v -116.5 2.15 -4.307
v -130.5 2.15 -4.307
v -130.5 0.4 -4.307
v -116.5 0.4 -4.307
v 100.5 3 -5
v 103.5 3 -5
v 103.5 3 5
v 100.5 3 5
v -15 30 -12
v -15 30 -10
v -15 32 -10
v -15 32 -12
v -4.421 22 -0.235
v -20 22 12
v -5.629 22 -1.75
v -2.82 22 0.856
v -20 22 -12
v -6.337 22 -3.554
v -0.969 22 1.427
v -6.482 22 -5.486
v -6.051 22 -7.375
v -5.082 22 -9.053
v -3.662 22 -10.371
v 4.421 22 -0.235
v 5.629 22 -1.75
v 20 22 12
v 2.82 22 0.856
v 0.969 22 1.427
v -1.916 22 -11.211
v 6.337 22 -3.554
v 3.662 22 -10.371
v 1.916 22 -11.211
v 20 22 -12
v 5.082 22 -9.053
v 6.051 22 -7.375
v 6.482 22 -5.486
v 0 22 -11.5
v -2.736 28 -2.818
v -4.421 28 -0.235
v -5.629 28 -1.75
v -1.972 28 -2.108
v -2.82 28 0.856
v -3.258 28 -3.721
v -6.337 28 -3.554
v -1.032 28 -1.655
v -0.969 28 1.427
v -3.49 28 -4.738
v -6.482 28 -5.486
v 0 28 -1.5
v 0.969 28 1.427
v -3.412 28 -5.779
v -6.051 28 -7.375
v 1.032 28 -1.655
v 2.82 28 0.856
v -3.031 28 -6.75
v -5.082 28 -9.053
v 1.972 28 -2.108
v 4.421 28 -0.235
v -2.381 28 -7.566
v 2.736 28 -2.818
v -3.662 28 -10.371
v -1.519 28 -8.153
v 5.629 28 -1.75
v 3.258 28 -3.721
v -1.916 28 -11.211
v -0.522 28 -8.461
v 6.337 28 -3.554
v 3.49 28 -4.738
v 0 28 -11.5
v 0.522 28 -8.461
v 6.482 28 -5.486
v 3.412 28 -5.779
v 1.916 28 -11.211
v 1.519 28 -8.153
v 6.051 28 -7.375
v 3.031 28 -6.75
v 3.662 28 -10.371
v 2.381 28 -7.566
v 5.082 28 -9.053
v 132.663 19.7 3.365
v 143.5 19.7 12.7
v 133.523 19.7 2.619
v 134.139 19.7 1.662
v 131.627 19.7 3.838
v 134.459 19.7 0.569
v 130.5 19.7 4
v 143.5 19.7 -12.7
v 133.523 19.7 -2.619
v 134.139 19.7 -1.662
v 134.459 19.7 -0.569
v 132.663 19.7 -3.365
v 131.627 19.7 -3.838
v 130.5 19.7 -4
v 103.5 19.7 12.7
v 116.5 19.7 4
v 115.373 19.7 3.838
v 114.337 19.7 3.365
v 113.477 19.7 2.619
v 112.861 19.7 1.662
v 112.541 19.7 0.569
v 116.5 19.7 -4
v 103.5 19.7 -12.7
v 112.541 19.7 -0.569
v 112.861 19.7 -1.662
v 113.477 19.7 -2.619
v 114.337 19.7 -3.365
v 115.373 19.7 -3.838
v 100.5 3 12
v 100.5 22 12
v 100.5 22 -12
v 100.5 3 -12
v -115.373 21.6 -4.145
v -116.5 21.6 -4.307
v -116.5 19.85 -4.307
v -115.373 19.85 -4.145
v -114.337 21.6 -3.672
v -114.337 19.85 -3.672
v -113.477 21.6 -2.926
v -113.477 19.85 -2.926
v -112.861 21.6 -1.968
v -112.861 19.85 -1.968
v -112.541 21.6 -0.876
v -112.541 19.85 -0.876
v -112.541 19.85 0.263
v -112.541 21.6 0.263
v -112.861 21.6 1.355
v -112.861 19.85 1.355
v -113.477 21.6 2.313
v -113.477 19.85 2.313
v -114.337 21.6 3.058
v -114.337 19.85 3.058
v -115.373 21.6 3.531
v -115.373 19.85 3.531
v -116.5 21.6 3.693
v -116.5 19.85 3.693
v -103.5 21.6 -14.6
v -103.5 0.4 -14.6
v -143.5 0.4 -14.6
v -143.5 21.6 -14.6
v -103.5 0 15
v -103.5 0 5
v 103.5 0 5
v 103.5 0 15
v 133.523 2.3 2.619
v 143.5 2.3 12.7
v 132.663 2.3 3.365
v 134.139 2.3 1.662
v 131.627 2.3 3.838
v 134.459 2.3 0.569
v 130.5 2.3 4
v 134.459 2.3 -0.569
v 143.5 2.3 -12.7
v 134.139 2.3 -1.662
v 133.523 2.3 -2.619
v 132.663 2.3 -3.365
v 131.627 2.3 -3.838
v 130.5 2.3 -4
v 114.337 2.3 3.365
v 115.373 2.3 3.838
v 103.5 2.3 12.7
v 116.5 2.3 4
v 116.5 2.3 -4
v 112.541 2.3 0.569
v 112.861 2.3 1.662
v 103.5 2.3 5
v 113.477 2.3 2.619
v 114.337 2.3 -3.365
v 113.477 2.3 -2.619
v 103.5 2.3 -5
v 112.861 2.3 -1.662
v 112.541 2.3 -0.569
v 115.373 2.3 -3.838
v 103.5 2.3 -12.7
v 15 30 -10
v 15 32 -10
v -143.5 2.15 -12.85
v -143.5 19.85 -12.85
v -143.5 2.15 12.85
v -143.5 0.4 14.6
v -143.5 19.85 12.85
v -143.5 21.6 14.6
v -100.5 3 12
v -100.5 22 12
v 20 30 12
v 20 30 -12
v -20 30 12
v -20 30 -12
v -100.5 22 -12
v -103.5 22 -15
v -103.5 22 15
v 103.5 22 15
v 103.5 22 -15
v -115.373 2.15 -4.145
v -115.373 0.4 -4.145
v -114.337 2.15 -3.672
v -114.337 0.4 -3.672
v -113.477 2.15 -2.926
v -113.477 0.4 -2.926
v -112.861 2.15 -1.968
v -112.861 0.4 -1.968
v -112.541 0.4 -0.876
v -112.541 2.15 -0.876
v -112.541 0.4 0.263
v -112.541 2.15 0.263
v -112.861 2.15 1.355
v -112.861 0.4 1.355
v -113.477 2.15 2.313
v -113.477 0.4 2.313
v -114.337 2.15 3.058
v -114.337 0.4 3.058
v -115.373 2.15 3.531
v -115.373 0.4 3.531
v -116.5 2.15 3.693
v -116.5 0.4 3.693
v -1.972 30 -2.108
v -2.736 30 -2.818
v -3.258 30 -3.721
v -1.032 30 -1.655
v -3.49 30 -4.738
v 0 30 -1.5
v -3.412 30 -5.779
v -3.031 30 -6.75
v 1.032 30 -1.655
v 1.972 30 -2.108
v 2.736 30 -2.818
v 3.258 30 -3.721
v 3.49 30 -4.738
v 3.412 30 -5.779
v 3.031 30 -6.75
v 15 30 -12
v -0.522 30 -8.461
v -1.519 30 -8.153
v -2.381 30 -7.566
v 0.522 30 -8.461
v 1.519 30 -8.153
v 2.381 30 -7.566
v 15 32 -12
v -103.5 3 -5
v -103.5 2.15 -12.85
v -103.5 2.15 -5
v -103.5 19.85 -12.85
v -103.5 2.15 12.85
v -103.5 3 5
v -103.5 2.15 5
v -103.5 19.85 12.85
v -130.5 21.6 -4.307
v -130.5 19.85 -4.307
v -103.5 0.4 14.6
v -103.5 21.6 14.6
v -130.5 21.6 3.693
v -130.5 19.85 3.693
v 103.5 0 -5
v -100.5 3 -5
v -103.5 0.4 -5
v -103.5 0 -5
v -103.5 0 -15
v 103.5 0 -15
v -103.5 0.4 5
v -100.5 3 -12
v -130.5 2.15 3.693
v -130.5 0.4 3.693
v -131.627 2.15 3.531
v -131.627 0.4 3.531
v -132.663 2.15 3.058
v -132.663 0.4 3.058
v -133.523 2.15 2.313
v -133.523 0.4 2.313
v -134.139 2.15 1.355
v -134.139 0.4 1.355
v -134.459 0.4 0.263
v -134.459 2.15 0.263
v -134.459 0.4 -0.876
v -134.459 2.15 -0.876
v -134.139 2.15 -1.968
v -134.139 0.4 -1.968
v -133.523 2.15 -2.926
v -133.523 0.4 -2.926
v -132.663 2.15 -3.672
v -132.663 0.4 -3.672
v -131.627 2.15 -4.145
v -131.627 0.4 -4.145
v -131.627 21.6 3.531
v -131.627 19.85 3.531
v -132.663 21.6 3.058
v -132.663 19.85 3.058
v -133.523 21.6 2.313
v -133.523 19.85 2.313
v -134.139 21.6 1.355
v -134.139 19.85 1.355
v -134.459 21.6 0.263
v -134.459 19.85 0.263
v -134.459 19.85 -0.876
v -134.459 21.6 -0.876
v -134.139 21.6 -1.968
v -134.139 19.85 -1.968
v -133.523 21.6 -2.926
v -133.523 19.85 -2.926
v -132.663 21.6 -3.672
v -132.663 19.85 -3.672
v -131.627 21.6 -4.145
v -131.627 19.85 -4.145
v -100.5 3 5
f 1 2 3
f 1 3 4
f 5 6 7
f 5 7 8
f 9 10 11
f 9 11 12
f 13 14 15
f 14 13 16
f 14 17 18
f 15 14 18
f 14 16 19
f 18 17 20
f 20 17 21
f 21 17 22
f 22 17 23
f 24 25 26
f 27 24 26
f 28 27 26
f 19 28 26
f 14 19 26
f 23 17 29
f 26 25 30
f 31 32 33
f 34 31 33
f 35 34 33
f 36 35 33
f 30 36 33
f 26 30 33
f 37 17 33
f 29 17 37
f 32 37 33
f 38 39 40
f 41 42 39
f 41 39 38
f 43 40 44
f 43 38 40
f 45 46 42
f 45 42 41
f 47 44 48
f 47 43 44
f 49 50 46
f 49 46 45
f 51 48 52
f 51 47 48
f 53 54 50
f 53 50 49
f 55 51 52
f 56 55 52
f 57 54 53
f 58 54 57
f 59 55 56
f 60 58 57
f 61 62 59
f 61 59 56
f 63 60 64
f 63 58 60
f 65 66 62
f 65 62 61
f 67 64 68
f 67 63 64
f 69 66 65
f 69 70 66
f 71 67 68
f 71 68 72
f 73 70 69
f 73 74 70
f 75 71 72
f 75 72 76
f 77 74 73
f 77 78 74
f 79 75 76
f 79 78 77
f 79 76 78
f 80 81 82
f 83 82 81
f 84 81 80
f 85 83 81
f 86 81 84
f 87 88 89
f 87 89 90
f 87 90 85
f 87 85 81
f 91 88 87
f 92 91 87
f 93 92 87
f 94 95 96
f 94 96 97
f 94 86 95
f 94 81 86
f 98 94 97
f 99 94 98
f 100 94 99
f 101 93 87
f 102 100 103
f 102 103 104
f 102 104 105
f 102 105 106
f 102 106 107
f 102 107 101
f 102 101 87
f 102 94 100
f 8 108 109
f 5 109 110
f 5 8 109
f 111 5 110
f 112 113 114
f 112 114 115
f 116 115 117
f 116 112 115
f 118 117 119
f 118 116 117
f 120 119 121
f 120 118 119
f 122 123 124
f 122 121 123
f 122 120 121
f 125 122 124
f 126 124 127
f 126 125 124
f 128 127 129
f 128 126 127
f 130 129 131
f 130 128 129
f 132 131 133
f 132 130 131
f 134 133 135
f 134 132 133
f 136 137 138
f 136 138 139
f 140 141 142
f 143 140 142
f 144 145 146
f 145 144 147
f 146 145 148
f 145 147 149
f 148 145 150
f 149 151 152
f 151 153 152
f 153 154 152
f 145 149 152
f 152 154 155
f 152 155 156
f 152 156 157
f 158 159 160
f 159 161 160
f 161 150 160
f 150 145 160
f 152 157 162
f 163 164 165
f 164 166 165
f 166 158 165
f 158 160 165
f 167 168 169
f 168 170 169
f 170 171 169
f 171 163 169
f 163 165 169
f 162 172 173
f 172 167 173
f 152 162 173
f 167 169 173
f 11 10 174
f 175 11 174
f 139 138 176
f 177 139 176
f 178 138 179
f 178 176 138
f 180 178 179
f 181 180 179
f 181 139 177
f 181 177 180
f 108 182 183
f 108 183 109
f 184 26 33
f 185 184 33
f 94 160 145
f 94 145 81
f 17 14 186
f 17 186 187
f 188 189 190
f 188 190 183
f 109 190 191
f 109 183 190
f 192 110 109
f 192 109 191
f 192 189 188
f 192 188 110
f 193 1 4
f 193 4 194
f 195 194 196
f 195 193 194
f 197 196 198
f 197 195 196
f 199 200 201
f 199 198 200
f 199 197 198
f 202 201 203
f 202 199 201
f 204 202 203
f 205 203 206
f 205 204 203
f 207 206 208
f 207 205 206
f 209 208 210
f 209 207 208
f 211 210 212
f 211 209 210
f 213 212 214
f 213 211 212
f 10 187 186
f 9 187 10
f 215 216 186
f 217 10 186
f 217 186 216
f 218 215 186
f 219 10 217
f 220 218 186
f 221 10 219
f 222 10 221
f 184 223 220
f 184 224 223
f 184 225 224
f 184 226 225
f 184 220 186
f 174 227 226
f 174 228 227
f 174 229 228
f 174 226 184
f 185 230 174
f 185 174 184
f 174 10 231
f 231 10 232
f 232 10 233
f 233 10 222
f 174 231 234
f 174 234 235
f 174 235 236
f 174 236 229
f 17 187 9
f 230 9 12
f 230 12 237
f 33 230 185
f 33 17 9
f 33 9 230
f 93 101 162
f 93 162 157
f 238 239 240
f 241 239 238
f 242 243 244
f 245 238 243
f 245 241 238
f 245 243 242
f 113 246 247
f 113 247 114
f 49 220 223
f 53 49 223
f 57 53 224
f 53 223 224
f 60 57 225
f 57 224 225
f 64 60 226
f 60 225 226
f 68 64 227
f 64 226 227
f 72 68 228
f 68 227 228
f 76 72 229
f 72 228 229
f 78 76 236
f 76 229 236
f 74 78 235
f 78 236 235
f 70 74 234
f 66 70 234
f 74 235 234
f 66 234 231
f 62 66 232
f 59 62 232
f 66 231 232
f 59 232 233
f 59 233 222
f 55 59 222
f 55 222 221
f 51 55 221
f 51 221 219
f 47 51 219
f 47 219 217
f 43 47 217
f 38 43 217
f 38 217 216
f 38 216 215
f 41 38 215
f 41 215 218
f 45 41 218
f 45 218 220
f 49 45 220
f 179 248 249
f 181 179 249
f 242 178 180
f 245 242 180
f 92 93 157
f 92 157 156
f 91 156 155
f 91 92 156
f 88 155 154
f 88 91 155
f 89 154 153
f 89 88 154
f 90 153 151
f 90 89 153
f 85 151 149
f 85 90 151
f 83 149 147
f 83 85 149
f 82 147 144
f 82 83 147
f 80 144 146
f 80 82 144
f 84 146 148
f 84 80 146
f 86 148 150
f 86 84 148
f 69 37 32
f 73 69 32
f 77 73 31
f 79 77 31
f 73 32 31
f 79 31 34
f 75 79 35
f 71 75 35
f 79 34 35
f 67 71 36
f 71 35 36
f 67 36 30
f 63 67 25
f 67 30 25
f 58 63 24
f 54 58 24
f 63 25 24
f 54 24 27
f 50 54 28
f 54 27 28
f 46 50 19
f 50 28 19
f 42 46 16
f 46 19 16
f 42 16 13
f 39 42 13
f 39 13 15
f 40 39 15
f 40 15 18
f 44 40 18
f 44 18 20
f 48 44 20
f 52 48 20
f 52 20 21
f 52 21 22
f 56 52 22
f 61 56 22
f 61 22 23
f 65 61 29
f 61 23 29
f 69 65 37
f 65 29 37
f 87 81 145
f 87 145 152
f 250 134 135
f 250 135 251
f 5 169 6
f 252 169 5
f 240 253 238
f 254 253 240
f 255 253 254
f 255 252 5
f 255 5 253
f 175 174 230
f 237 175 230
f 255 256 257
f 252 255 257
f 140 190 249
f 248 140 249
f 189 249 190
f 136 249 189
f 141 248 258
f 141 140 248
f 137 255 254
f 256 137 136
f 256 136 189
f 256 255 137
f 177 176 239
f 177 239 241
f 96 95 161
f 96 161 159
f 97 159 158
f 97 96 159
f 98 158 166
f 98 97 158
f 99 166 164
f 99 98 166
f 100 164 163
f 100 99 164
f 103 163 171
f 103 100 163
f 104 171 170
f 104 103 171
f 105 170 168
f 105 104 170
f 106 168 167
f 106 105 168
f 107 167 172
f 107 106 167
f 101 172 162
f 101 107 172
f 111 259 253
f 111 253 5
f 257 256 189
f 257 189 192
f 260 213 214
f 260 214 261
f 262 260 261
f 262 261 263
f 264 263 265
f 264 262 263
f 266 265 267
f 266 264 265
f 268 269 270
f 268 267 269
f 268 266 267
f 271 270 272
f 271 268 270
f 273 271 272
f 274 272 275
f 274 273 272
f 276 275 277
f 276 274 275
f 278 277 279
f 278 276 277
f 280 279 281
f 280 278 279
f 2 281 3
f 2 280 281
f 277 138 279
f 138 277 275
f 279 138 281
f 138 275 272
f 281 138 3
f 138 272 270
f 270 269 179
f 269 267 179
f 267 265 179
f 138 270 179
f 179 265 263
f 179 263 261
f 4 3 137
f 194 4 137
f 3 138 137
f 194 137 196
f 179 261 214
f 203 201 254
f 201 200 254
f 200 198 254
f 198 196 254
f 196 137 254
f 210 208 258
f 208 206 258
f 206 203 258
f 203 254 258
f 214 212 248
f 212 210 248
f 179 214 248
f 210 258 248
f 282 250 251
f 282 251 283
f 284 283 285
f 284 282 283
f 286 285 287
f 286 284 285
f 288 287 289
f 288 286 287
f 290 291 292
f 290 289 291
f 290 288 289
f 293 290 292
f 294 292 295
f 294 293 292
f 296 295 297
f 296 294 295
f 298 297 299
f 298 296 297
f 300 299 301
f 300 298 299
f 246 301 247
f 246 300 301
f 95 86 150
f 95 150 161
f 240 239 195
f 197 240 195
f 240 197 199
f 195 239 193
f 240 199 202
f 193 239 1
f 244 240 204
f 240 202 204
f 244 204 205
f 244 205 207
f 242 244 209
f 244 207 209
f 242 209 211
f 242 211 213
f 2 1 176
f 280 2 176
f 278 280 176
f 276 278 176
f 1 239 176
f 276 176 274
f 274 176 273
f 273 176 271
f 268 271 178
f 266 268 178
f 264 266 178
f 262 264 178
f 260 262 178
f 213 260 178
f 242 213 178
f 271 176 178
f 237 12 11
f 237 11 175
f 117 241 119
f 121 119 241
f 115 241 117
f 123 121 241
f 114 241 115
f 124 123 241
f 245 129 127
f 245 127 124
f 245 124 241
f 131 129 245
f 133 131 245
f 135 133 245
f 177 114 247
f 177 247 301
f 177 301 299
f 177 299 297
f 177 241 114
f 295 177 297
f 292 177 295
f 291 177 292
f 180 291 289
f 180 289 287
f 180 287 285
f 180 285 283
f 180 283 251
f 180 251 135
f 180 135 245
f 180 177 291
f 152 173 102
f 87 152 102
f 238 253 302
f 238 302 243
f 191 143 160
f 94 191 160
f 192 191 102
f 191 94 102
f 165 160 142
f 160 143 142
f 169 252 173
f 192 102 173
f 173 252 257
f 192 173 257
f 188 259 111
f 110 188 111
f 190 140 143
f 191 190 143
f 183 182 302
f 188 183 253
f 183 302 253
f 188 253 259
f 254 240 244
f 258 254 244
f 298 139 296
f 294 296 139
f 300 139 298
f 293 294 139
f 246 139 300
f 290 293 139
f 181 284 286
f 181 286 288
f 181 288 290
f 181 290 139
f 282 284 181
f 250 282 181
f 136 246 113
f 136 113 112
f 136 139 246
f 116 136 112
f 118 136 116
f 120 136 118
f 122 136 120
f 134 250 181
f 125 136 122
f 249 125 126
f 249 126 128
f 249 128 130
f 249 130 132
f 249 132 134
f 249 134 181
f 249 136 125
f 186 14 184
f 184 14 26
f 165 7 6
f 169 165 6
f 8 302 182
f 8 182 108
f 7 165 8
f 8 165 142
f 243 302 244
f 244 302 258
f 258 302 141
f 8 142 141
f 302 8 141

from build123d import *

# Parameters (mm, degrees)
SKETCH1_W           = 207
SKETCH1_H           = 30
BOSS_EXTRUDE1_DEPTH = 22
SHELL1_T            = -3
SKETCH2_W           = 207
SKETCH2_H           = 10
CUT_EXTRUDE1_DEPTH  = 3
SKETCH3_W           = 29.2
SKETCH3_H           = 21.2
BOSS_EXTRUDE2_DEPTH = 40
SKETCH4_W           = 25.7
SKETCH4_H           = 17.7
CUT_EXTRUDE2_DEPTH  = 40
CUT_EXTRUDE3_DEPTH  = 146.889718623
SKETCH6_W           = 25.4
SKETCH6_H           = 17.4
BOSS_EXTRUDE3_DEPTH = 40
CUT_EXTRUDE4_DEPTH  = 146.620534266
SKETCH8_W           = 40
SKETCH8_H           = 24
BOSS_EXTRUDE4_DEPTH = 8
SKETCH9_R           = 3.5
CUT_EXTRUDE6_DEPTH  = 8
SKETCH10_R          = 6.5
CUT_EXTRUDE10_DEPTH = 6
SKETCH11_W          = 30
SKETCH11_H          = 2
BOSS_EXTRUDE5_DEPTH = 2


with BuildPart() as part:
    # Sketch1 → Boss-Extrude1 (new body)
    with BuildSketch(Plane(origin=(0, 0, 0), x_dir=(1, 0, 0), z_dir=(0, 1, 0))):
        Rectangle(SKETCH1_W, SKETCH1_H)
    extrude(amount=BOSS_EXTRUDE1_DEPTH)

    # Shell1
    shell1_openings = [part.faces().sort_by_distance(p)[0] for p in [
        (0, 22, 0),
    ]]
    offset(amount=SHELL1_T, openings=shell1_openings, kind=Kind.INTERSECTION)

    # Sketch2 → Cut-Extrude1 (cut)
    with BuildSketch(Plane(origin=(0, 0, 0), x_dir=(-1, 0, 0), z_dir=(0, -1, 0))):
        Rectangle(SKETCH2_W, SKETCH2_H)
    extrude(amount=-CUT_EXTRUDE1_DEPTH, mode=Mode.SUBTRACT)

    # Sketch3 → Boss-Extrude2 (add)
    with BuildSketch(Plane.ZY.offset(103.5)):
        with Locations((0, 11)):
            Rectangle(SKETCH3_W, SKETCH3_H)
    extrude(amount=BOSS_EXTRUDE2_DEPTH)

    # Sketch4 → Cut-Extrude2 (cut)
    with BuildSketch(Plane.ZY.offset(143.5)):
        with Locations((0, 11)):
            Rectangle(SKETCH4_W, SKETCH4_H)
    extrude(amount=-CUT_EXTRUDE2_DEPTH, mode=Mode.SUBTRACT)

    # Sketch5 → Cut-Extrude3 (cut, through all)
    with BuildSketch(Plane(origin=(0, 21.6, 0), x_dir=(1, 0, 0), z_dir=(0, 1, 0))):
        with BuildLine():
            Line((-130.5, 4.306739795), (-116.5, 4.306739795))
            ThreePointArc((-116.5, 4.306739795), (-112.5, 0.306739795), (-116.5, -3.693260205))
            Line((-116.5, -3.693260205), (-130.5, -3.693260205))
            ThreePointArc((-130.5, -3.693260205), (-134.5, 0.306739795), (-130.5, 4.306739795))
        make_face()
    extrude(amount=-CUT_EXTRUDE3_DEPTH, mode=Mode.SUBTRACT)

    # Sketch6 → Boss-Extrude3 (add)
    with BuildSketch(Plane(origin=(103.5, 0, 0), x_dir=(0, 0, -1), z_dir=(1, 0, 0))):
        with Locations((0, 11)):
            Rectangle(SKETCH6_W, SKETCH6_H)
    extrude(amount=BOSS_EXTRUDE3_DEPTH)

    # Sketch7 → Cut-Extrude4 (cut, through all)
    with BuildSketch(Plane(origin=(0, 19.7, 0), x_dir=(1, 0, 0), z_dir=(0, 1, 0))):
        with BuildLine():
            Line((116.5, 4), (130.5, 4))
            ThreePointArc((130.5, 4), (134.5, 0), (130.5, -4))
            Line((130.5, -4), (116.5, -4))
            ThreePointArc((116.5, -4), (112.5, 0), (116.5, 4))
        make_face()
    extrude(amount=-CUT_EXTRUDE4_DEPTH, mode=Mode.SUBTRACT)


with BuildPart() as body_2:
    # Sketch8 → Boss-Extrude4 (new body)
    with BuildSketch(Plane(origin=(0, 22, 0), x_dir=(1, 0, 0), z_dir=(0, 1, 0))):
        Rectangle(SKETCH8_W, SKETCH8_H)
    extrude(amount=BOSS_EXTRUDE4_DEPTH)

    # Sketch9 → Cut-Extrude6 (cut)
    with BuildSketch(Plane(origin=(0, 30, 0), x_dir=(1, 0, 0), z_dir=(0, 1, 0))):
        with Locations(Location((0, 5, 0), (0, 0, 270))):
            Circle(SKETCH9_R)
    extrude(amount=-CUT_EXTRUDE6_DEPTH, mode=Mode.SUBTRACT)

    # Sketch10 → Cut-Extrude10 (cut)
    with BuildSketch(Plane.XZ.offset(-22)):
        with Locations(Location((0, -5, 0), (0, 0, 270))):
            Circle(SKETCH10_R)
    extrude(amount=-CUT_EXTRUDE10_DEPTH, mode=Mode.SUBTRACT)

    # Sketch11 → Boss-Extrude5 (add)
    with BuildSketch(Plane(origin=(0, 30, 0), x_dir=(1, 0, 0), z_dir=(0, 1, 0))):
        with Locations((0, 11)):
            Rectangle(SKETCH11_W, SKETCH11_H)
    extrude(amount=BOSS_EXTRUDE5_DEPTH)


solid = Compound([part.part, body_2.part])
